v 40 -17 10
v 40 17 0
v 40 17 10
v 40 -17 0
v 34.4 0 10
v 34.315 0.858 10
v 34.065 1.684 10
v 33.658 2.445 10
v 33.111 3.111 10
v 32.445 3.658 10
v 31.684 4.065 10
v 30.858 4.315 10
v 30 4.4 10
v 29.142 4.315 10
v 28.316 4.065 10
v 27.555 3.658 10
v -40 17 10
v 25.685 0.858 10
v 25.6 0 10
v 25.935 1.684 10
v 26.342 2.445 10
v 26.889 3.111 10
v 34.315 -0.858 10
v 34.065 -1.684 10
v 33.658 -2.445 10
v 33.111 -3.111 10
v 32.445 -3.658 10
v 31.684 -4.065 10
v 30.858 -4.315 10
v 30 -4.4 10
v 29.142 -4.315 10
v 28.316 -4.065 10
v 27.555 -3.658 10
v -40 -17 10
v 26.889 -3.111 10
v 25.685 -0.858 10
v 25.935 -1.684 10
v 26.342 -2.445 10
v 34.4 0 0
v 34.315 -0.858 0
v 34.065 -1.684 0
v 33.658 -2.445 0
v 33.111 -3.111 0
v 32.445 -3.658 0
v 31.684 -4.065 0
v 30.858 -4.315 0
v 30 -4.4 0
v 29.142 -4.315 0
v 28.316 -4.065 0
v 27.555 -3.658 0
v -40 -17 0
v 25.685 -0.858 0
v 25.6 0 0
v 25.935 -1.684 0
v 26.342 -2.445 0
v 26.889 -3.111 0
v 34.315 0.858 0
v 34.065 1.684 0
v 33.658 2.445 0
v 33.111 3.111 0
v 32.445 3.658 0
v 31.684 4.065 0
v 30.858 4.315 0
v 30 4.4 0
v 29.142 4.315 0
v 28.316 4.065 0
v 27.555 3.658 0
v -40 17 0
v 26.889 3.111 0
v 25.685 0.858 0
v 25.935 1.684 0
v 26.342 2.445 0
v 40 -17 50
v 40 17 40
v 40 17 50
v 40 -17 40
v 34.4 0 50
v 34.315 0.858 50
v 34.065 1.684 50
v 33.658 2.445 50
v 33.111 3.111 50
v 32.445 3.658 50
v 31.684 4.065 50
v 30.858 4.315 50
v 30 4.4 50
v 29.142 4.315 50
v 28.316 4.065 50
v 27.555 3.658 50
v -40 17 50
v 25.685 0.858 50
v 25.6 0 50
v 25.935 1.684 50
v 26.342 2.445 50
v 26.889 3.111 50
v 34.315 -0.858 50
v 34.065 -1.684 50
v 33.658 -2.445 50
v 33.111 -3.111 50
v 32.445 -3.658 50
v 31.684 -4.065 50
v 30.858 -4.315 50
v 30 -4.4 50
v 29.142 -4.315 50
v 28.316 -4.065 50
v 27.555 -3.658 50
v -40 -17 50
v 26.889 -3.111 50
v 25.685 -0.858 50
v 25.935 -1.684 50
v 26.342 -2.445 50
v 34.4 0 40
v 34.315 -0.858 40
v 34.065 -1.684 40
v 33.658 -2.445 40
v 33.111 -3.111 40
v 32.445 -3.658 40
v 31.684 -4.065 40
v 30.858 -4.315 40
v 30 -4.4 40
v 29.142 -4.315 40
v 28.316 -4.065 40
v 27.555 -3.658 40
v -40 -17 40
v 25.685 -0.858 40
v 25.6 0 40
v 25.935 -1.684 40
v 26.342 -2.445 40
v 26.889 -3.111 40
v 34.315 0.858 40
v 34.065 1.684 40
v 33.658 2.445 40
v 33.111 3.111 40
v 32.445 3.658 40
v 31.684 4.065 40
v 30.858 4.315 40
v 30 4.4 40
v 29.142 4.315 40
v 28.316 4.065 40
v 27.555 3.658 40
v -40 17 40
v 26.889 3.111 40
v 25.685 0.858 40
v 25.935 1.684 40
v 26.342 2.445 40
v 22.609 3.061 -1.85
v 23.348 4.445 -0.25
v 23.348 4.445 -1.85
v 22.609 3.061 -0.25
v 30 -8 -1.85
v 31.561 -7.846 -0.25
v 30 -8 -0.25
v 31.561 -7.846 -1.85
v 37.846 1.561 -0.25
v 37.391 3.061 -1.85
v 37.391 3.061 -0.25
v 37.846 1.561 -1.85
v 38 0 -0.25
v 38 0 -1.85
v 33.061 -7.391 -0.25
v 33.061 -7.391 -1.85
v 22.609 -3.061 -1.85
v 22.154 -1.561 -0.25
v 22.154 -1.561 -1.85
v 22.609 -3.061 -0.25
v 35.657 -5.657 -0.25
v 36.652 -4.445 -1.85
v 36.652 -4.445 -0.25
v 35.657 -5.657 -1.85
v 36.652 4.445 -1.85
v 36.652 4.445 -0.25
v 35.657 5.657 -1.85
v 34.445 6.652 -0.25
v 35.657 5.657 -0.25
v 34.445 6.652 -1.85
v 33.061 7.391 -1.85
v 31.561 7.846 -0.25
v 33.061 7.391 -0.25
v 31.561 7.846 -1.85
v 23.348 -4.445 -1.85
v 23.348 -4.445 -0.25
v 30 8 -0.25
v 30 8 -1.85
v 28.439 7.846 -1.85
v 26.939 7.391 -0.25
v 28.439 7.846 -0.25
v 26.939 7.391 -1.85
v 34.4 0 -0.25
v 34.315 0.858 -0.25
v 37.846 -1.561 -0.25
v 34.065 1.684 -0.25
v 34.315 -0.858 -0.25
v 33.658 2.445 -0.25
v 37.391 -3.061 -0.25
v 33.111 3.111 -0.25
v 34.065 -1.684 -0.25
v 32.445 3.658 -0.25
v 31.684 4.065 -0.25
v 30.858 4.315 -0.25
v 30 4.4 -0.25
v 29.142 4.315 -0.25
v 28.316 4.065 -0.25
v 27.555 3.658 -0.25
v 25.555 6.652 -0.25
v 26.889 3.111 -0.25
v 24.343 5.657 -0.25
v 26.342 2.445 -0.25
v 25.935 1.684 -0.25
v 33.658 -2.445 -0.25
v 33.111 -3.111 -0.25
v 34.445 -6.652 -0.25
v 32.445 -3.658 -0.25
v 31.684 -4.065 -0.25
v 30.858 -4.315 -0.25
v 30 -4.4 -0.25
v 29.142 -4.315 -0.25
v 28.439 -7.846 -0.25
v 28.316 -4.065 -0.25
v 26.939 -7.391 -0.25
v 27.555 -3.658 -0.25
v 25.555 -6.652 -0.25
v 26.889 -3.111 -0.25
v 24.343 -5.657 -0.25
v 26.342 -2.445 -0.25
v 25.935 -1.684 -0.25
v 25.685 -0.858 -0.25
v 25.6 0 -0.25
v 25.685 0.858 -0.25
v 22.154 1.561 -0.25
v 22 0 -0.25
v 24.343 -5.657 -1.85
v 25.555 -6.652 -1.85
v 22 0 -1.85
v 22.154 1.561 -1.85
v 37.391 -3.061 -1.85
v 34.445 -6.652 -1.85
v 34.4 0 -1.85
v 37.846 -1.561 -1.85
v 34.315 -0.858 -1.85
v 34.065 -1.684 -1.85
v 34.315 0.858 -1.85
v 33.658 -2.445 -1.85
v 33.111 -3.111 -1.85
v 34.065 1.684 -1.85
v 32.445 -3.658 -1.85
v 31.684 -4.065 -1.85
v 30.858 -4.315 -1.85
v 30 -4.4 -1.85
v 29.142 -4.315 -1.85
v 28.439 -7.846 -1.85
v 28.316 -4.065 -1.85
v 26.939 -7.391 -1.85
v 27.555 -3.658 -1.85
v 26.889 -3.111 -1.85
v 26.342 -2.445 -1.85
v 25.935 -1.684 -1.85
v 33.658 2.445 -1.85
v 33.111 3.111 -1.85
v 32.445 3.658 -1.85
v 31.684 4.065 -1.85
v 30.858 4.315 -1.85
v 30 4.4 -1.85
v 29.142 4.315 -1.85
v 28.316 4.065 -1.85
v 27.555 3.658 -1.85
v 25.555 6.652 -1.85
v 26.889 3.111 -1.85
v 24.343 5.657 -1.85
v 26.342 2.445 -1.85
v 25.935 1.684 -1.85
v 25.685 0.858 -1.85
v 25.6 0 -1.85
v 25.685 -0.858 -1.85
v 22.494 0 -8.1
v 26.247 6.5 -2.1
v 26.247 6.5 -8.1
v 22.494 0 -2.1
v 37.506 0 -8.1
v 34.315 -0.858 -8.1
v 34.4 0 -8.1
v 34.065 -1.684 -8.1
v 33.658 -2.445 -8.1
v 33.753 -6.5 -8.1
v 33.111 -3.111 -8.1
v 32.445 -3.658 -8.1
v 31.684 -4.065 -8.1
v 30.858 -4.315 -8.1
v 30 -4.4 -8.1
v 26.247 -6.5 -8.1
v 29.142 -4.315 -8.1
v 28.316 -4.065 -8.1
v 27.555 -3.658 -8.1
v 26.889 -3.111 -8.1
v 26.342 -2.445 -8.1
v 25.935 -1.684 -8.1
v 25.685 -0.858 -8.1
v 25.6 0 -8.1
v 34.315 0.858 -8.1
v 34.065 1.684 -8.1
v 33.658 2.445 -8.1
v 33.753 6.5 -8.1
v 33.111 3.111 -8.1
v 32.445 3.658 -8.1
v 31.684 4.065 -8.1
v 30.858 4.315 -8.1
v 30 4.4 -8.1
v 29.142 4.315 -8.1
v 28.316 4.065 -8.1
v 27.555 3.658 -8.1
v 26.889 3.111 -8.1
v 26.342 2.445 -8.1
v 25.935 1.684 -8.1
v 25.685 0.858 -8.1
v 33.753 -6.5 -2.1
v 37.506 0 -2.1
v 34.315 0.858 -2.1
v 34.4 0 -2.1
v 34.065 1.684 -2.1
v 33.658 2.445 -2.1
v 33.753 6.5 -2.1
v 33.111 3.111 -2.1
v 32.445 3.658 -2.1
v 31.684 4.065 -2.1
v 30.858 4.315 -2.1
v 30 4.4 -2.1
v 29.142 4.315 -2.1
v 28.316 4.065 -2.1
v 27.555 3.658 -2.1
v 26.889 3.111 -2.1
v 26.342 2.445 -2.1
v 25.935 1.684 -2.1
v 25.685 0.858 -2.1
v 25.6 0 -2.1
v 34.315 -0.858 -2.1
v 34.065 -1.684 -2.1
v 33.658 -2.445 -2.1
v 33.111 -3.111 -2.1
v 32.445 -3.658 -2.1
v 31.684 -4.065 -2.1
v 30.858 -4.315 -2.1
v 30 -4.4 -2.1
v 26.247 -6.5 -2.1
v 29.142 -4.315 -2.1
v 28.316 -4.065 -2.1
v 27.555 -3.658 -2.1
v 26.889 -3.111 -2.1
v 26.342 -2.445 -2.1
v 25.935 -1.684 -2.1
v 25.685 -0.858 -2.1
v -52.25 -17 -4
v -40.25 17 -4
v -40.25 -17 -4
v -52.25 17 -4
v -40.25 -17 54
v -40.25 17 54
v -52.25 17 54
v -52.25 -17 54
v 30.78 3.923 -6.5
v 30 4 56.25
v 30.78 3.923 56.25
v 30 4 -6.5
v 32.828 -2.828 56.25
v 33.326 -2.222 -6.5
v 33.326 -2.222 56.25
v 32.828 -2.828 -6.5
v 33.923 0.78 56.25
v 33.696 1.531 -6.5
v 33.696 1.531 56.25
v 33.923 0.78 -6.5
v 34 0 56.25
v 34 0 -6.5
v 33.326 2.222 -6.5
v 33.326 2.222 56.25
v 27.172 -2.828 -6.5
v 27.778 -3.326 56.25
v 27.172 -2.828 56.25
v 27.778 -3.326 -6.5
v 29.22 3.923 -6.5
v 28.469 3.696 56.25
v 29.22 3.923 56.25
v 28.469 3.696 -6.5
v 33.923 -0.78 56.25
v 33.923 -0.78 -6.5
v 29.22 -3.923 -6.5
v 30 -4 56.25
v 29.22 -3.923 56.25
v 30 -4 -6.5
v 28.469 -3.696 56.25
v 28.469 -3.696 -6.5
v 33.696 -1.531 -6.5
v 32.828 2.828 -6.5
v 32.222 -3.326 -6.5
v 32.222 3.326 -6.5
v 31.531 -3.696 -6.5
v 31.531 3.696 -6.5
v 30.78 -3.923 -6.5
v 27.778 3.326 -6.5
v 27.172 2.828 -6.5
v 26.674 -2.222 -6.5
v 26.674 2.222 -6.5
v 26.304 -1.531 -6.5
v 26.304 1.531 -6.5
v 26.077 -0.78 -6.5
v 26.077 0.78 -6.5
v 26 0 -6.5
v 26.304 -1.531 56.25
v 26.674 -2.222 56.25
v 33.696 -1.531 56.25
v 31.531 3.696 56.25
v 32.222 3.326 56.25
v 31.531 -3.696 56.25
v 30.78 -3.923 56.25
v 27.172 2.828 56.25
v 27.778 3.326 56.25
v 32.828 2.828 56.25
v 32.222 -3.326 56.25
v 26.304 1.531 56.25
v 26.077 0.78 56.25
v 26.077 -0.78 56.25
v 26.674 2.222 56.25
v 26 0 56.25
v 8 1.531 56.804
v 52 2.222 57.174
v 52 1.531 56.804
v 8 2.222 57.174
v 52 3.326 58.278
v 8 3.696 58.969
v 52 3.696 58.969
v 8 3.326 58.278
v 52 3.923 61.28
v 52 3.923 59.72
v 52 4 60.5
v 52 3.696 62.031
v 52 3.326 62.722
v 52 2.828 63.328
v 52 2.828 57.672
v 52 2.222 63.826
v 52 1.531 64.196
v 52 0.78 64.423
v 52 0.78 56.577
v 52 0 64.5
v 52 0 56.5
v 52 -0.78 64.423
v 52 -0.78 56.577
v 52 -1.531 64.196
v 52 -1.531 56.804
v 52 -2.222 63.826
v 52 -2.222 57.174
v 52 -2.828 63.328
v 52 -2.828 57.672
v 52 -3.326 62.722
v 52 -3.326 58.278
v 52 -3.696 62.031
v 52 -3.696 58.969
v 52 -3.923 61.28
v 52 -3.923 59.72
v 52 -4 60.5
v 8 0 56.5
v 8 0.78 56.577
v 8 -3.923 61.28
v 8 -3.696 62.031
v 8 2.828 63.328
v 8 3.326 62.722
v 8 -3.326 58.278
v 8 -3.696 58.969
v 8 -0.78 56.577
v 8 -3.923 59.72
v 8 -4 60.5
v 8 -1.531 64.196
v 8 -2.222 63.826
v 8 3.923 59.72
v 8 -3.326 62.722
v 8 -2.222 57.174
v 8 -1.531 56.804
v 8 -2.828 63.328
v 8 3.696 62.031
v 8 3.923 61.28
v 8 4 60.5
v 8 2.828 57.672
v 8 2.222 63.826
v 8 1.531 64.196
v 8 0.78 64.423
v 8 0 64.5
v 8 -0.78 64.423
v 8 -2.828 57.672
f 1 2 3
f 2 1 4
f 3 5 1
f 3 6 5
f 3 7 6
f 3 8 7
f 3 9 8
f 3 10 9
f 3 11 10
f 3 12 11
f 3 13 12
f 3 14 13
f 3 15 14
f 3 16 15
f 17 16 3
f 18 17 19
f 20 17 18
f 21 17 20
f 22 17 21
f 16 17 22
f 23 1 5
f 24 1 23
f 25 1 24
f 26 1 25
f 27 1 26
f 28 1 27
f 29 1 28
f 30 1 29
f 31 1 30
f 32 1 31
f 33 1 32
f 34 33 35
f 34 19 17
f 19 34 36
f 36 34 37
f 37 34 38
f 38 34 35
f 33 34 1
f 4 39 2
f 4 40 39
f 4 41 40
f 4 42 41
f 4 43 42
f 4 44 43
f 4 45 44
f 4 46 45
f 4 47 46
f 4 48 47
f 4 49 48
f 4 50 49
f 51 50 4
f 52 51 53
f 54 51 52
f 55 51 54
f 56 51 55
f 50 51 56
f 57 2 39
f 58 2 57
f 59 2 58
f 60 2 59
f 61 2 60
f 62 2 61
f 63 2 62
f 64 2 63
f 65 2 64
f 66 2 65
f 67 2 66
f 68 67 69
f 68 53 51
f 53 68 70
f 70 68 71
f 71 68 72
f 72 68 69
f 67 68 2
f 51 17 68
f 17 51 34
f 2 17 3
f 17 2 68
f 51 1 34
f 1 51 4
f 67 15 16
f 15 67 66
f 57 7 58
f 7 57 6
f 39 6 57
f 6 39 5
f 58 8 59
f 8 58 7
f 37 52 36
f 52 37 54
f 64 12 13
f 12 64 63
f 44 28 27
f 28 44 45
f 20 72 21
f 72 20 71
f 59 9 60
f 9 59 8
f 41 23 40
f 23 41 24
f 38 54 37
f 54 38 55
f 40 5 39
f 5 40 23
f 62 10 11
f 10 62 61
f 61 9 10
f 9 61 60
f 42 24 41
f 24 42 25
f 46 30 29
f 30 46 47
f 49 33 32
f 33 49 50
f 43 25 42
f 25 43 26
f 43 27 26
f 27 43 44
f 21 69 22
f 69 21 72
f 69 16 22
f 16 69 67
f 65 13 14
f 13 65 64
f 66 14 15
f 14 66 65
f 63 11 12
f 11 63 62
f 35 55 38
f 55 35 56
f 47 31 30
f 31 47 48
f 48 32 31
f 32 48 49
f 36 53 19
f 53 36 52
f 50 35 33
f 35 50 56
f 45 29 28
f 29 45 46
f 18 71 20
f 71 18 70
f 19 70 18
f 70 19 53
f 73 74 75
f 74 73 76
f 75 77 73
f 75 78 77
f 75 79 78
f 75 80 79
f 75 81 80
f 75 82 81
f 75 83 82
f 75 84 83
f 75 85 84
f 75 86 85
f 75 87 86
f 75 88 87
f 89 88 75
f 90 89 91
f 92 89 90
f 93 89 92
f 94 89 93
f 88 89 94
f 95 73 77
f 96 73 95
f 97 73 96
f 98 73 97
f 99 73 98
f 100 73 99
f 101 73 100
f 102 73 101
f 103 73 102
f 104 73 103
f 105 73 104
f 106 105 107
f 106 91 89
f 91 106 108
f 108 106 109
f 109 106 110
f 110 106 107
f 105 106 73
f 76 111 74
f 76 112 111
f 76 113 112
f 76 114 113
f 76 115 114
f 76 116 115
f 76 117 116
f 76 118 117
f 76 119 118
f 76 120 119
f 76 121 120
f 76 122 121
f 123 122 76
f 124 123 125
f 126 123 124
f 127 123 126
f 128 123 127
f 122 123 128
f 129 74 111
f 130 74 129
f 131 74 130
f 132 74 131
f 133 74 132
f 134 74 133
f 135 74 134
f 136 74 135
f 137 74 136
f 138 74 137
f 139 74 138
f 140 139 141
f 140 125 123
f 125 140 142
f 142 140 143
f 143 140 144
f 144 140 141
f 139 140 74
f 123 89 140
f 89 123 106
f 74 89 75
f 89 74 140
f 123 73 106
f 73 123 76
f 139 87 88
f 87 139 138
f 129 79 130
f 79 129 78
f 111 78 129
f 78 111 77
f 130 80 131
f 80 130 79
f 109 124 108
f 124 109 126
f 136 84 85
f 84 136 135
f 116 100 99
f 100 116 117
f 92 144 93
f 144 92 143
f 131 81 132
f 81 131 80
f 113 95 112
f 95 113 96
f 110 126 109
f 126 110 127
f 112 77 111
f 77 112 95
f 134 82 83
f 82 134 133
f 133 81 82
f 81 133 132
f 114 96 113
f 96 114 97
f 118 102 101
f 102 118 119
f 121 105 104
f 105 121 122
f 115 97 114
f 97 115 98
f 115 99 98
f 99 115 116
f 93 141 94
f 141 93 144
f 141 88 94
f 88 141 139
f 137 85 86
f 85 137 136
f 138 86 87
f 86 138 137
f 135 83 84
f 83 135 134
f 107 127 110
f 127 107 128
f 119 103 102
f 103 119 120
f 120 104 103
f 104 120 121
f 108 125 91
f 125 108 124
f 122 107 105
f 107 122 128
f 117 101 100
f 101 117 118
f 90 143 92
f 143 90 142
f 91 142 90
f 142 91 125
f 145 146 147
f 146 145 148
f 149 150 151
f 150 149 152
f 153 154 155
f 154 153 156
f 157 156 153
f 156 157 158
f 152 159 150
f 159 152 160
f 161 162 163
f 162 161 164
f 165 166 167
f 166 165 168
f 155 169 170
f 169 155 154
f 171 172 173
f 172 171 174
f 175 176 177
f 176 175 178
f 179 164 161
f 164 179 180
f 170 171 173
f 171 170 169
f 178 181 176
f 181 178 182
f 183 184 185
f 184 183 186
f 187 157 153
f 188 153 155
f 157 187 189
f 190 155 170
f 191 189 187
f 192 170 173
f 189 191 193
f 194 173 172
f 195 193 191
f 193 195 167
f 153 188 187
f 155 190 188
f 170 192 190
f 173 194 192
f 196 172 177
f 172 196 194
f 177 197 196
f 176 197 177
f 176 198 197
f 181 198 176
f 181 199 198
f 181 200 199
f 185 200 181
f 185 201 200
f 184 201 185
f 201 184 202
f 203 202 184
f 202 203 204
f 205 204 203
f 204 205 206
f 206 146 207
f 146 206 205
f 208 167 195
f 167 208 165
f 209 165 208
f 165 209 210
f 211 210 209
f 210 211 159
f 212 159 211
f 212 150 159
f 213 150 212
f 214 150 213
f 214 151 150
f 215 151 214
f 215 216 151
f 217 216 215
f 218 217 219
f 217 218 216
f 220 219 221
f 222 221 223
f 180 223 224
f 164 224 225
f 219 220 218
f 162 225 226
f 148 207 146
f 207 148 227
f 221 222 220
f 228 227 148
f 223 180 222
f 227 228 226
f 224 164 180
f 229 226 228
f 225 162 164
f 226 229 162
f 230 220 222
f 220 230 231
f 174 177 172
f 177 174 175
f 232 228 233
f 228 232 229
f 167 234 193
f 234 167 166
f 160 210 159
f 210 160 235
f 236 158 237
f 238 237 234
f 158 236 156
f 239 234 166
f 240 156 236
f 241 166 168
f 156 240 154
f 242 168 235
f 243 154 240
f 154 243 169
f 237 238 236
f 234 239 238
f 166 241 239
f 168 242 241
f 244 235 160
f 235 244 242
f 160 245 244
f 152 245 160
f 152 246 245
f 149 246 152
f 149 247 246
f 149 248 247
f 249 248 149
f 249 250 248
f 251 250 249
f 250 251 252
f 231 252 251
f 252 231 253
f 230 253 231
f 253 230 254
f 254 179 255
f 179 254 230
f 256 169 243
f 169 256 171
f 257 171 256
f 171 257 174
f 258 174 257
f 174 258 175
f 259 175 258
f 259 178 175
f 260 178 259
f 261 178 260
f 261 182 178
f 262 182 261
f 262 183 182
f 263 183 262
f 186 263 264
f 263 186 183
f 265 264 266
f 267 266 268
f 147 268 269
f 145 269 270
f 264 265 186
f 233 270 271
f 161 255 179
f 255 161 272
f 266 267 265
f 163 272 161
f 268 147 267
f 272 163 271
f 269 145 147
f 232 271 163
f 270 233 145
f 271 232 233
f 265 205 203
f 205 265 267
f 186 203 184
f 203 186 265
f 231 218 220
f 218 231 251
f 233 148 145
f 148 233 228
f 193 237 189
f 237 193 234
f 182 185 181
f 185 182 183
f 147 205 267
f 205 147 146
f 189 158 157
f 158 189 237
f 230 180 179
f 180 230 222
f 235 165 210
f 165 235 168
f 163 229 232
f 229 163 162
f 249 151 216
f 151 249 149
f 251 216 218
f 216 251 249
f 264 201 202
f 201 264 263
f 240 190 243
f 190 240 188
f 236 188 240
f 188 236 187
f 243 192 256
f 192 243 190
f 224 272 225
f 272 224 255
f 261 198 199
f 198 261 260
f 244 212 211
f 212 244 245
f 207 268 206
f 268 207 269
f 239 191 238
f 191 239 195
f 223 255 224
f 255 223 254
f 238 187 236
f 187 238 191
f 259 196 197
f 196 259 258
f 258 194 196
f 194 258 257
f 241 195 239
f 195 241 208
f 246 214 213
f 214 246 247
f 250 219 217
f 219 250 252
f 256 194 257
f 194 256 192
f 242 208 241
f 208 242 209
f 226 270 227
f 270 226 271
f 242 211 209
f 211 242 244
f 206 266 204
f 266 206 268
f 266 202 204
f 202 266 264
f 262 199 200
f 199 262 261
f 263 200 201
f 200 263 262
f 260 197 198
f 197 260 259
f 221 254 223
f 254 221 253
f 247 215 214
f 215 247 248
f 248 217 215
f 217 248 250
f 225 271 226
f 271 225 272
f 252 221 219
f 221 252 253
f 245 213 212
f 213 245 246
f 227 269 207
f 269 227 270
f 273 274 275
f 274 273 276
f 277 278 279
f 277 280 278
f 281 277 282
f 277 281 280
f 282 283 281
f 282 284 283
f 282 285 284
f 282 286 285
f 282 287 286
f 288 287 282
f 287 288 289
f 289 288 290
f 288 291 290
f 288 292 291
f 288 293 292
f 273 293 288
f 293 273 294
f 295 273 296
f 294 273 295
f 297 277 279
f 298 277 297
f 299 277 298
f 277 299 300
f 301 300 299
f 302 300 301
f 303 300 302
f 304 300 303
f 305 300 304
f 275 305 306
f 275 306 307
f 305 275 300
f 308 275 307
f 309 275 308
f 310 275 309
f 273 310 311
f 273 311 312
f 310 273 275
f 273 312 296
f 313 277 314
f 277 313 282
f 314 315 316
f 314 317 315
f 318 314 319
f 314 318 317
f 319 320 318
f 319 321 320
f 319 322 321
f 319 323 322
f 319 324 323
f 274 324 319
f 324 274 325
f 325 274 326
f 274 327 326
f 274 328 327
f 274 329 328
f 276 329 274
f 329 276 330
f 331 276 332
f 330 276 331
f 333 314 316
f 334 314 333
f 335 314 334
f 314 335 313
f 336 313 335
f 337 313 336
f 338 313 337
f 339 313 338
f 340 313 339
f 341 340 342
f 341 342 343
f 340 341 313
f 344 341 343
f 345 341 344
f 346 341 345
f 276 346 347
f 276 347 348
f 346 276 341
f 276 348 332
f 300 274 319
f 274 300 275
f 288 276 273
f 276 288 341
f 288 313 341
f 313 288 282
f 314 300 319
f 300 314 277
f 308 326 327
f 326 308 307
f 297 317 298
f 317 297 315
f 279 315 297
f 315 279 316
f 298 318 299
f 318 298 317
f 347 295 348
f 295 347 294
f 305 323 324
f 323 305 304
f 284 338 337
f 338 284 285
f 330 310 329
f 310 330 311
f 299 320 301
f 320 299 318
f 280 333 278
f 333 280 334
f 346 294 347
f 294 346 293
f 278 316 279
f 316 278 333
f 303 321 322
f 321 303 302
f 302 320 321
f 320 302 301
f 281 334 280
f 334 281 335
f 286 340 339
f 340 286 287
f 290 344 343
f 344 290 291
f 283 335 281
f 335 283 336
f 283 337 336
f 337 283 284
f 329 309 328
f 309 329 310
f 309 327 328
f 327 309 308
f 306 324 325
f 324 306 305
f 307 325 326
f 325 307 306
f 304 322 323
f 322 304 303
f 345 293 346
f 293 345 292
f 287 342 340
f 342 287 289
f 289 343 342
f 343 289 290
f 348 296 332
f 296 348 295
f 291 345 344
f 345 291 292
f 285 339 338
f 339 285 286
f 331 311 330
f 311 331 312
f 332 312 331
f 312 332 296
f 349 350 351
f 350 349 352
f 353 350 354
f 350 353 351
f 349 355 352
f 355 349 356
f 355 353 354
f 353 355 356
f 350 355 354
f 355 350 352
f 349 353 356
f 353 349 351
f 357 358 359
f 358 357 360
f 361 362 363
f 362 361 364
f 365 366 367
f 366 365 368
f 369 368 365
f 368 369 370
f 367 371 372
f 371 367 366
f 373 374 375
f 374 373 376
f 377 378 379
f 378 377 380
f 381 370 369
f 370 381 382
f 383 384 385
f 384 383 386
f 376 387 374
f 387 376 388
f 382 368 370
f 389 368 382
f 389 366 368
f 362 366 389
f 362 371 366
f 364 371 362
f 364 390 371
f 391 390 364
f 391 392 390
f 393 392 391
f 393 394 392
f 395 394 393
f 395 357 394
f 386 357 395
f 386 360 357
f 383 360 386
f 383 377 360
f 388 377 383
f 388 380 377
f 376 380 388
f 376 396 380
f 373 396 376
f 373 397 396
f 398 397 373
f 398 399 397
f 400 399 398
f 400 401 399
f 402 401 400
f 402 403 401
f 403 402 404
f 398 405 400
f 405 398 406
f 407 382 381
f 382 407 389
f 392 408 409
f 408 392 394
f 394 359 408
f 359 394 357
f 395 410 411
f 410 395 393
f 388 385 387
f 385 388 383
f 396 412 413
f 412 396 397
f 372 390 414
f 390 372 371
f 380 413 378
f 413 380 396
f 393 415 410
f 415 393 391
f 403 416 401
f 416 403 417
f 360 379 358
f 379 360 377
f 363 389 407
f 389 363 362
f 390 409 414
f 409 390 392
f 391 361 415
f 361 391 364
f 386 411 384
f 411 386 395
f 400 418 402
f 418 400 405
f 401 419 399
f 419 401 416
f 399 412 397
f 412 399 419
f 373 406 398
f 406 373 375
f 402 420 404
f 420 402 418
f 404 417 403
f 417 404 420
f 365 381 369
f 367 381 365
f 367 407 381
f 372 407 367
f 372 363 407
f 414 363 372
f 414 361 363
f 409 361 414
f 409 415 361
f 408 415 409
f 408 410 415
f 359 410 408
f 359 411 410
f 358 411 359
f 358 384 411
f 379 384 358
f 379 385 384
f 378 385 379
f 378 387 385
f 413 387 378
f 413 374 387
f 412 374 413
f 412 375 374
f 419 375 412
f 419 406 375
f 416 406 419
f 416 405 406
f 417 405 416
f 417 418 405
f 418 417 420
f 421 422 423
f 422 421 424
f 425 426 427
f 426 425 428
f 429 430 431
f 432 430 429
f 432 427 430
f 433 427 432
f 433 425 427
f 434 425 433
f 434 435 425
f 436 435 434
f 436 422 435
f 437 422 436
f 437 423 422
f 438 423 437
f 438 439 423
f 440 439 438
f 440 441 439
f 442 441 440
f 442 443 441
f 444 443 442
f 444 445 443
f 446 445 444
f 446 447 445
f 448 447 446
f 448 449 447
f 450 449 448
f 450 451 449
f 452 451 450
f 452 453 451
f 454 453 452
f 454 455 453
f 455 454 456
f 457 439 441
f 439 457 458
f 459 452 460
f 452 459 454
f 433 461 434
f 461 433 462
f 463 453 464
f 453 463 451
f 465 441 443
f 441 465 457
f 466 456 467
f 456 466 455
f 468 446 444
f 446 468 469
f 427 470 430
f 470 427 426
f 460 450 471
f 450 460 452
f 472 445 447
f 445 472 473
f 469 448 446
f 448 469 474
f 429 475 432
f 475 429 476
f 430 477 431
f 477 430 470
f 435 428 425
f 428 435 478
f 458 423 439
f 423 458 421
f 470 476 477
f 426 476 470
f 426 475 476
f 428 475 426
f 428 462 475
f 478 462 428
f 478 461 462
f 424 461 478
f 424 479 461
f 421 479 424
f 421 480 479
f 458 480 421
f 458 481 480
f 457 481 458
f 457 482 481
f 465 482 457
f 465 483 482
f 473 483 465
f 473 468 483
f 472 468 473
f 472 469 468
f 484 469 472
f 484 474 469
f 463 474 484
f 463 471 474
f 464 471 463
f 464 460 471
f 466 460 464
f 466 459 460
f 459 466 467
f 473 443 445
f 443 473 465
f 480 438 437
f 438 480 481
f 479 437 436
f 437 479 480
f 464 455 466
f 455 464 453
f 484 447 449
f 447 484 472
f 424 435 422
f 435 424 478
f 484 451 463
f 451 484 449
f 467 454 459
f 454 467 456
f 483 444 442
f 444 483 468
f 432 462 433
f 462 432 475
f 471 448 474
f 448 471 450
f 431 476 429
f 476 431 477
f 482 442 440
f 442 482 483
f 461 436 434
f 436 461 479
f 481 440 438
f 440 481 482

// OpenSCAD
$fn = 32;

// ------------------------------------------------------------------------
// C clamp: throat 40 mm, screw d8
// Every part is its own module, assembly() places every instance.
// ------------------------------------------------------------------------

// --- part 1 ---
module clamp_arm() {
  difference() {
    translate([-40, -17, 0]) cube([80, 34, 10]);
    translate([30, 0, -1]) cylinder(h = 12, d = 8.8);
  }
}

// --- part 2 ---
module clamp_spine() {
  difference() {
    translate([-29, -17, 0]) cube([58, 34, 12]);
  }
}

// --- part 3 ---
module clamp_screw() {
  translate([0, 0, -31.375]) cylinder(h = 62.75, d = 8);
}

// --- part 4 ---
module clamp_washer() {
  difference() {
      translate([0, 0, 0]) cylinder(h = 1.6, d = 16);
      translate([0, 0, -1]) cylinder(h = 3.6, d = 8.8);
    }
}

// --- part 5 ---
module clamp_nut() {
  difference() {
    linear_extrude(height = 6) polygon(points = [[7.506, 0], [3.753, 6.5], [-3.753, 6.5], [-7.506, 0], [-3.753, -6.5], [3.753, -6.5]]);
    translate([0, 0, -1]) cylinder(h = 8, d = 8.8);
  }
}

// --- part 6 ---
module tommy_bar() {
  translate([0, 0, -22]) cylinder(h = 44, d = 8);
}

// --- assembly ---
module assembly() {
  color([0.80, 0.24, 0.20]) translate([0, 0, 0]) rotate([0, 0, 0]) clamp_arm();
  color([0.20, 0.45, 0.75]) translate([0, 0, 40]) rotate([0, 0, 0]) clamp_arm();
  color([0.25, 0.62, 0.32]) translate([-52.25, 0, 25]) rotate([0, 90, 0]) clamp_spine();
  color([0.92, 0.70, 0.18]) translate([30, 0, 24.875]) rotate([0, 0, 0]) clamp_screw();
  color([0.58, 0.35, 0.70]) translate([30, 0, -1.85]) rotate([0, 0, 0]) clamp_washer();
  color([0.16, 0.66, 0.66]) translate([30, 0, -8.1]) rotate([0, 0, 0]) clamp_nut();
  color([0.85, 0.48, 0.18]) translate([30, 0, 60.5]) rotate([0, 90, 0]) tommy_bar();
}

assembly();
